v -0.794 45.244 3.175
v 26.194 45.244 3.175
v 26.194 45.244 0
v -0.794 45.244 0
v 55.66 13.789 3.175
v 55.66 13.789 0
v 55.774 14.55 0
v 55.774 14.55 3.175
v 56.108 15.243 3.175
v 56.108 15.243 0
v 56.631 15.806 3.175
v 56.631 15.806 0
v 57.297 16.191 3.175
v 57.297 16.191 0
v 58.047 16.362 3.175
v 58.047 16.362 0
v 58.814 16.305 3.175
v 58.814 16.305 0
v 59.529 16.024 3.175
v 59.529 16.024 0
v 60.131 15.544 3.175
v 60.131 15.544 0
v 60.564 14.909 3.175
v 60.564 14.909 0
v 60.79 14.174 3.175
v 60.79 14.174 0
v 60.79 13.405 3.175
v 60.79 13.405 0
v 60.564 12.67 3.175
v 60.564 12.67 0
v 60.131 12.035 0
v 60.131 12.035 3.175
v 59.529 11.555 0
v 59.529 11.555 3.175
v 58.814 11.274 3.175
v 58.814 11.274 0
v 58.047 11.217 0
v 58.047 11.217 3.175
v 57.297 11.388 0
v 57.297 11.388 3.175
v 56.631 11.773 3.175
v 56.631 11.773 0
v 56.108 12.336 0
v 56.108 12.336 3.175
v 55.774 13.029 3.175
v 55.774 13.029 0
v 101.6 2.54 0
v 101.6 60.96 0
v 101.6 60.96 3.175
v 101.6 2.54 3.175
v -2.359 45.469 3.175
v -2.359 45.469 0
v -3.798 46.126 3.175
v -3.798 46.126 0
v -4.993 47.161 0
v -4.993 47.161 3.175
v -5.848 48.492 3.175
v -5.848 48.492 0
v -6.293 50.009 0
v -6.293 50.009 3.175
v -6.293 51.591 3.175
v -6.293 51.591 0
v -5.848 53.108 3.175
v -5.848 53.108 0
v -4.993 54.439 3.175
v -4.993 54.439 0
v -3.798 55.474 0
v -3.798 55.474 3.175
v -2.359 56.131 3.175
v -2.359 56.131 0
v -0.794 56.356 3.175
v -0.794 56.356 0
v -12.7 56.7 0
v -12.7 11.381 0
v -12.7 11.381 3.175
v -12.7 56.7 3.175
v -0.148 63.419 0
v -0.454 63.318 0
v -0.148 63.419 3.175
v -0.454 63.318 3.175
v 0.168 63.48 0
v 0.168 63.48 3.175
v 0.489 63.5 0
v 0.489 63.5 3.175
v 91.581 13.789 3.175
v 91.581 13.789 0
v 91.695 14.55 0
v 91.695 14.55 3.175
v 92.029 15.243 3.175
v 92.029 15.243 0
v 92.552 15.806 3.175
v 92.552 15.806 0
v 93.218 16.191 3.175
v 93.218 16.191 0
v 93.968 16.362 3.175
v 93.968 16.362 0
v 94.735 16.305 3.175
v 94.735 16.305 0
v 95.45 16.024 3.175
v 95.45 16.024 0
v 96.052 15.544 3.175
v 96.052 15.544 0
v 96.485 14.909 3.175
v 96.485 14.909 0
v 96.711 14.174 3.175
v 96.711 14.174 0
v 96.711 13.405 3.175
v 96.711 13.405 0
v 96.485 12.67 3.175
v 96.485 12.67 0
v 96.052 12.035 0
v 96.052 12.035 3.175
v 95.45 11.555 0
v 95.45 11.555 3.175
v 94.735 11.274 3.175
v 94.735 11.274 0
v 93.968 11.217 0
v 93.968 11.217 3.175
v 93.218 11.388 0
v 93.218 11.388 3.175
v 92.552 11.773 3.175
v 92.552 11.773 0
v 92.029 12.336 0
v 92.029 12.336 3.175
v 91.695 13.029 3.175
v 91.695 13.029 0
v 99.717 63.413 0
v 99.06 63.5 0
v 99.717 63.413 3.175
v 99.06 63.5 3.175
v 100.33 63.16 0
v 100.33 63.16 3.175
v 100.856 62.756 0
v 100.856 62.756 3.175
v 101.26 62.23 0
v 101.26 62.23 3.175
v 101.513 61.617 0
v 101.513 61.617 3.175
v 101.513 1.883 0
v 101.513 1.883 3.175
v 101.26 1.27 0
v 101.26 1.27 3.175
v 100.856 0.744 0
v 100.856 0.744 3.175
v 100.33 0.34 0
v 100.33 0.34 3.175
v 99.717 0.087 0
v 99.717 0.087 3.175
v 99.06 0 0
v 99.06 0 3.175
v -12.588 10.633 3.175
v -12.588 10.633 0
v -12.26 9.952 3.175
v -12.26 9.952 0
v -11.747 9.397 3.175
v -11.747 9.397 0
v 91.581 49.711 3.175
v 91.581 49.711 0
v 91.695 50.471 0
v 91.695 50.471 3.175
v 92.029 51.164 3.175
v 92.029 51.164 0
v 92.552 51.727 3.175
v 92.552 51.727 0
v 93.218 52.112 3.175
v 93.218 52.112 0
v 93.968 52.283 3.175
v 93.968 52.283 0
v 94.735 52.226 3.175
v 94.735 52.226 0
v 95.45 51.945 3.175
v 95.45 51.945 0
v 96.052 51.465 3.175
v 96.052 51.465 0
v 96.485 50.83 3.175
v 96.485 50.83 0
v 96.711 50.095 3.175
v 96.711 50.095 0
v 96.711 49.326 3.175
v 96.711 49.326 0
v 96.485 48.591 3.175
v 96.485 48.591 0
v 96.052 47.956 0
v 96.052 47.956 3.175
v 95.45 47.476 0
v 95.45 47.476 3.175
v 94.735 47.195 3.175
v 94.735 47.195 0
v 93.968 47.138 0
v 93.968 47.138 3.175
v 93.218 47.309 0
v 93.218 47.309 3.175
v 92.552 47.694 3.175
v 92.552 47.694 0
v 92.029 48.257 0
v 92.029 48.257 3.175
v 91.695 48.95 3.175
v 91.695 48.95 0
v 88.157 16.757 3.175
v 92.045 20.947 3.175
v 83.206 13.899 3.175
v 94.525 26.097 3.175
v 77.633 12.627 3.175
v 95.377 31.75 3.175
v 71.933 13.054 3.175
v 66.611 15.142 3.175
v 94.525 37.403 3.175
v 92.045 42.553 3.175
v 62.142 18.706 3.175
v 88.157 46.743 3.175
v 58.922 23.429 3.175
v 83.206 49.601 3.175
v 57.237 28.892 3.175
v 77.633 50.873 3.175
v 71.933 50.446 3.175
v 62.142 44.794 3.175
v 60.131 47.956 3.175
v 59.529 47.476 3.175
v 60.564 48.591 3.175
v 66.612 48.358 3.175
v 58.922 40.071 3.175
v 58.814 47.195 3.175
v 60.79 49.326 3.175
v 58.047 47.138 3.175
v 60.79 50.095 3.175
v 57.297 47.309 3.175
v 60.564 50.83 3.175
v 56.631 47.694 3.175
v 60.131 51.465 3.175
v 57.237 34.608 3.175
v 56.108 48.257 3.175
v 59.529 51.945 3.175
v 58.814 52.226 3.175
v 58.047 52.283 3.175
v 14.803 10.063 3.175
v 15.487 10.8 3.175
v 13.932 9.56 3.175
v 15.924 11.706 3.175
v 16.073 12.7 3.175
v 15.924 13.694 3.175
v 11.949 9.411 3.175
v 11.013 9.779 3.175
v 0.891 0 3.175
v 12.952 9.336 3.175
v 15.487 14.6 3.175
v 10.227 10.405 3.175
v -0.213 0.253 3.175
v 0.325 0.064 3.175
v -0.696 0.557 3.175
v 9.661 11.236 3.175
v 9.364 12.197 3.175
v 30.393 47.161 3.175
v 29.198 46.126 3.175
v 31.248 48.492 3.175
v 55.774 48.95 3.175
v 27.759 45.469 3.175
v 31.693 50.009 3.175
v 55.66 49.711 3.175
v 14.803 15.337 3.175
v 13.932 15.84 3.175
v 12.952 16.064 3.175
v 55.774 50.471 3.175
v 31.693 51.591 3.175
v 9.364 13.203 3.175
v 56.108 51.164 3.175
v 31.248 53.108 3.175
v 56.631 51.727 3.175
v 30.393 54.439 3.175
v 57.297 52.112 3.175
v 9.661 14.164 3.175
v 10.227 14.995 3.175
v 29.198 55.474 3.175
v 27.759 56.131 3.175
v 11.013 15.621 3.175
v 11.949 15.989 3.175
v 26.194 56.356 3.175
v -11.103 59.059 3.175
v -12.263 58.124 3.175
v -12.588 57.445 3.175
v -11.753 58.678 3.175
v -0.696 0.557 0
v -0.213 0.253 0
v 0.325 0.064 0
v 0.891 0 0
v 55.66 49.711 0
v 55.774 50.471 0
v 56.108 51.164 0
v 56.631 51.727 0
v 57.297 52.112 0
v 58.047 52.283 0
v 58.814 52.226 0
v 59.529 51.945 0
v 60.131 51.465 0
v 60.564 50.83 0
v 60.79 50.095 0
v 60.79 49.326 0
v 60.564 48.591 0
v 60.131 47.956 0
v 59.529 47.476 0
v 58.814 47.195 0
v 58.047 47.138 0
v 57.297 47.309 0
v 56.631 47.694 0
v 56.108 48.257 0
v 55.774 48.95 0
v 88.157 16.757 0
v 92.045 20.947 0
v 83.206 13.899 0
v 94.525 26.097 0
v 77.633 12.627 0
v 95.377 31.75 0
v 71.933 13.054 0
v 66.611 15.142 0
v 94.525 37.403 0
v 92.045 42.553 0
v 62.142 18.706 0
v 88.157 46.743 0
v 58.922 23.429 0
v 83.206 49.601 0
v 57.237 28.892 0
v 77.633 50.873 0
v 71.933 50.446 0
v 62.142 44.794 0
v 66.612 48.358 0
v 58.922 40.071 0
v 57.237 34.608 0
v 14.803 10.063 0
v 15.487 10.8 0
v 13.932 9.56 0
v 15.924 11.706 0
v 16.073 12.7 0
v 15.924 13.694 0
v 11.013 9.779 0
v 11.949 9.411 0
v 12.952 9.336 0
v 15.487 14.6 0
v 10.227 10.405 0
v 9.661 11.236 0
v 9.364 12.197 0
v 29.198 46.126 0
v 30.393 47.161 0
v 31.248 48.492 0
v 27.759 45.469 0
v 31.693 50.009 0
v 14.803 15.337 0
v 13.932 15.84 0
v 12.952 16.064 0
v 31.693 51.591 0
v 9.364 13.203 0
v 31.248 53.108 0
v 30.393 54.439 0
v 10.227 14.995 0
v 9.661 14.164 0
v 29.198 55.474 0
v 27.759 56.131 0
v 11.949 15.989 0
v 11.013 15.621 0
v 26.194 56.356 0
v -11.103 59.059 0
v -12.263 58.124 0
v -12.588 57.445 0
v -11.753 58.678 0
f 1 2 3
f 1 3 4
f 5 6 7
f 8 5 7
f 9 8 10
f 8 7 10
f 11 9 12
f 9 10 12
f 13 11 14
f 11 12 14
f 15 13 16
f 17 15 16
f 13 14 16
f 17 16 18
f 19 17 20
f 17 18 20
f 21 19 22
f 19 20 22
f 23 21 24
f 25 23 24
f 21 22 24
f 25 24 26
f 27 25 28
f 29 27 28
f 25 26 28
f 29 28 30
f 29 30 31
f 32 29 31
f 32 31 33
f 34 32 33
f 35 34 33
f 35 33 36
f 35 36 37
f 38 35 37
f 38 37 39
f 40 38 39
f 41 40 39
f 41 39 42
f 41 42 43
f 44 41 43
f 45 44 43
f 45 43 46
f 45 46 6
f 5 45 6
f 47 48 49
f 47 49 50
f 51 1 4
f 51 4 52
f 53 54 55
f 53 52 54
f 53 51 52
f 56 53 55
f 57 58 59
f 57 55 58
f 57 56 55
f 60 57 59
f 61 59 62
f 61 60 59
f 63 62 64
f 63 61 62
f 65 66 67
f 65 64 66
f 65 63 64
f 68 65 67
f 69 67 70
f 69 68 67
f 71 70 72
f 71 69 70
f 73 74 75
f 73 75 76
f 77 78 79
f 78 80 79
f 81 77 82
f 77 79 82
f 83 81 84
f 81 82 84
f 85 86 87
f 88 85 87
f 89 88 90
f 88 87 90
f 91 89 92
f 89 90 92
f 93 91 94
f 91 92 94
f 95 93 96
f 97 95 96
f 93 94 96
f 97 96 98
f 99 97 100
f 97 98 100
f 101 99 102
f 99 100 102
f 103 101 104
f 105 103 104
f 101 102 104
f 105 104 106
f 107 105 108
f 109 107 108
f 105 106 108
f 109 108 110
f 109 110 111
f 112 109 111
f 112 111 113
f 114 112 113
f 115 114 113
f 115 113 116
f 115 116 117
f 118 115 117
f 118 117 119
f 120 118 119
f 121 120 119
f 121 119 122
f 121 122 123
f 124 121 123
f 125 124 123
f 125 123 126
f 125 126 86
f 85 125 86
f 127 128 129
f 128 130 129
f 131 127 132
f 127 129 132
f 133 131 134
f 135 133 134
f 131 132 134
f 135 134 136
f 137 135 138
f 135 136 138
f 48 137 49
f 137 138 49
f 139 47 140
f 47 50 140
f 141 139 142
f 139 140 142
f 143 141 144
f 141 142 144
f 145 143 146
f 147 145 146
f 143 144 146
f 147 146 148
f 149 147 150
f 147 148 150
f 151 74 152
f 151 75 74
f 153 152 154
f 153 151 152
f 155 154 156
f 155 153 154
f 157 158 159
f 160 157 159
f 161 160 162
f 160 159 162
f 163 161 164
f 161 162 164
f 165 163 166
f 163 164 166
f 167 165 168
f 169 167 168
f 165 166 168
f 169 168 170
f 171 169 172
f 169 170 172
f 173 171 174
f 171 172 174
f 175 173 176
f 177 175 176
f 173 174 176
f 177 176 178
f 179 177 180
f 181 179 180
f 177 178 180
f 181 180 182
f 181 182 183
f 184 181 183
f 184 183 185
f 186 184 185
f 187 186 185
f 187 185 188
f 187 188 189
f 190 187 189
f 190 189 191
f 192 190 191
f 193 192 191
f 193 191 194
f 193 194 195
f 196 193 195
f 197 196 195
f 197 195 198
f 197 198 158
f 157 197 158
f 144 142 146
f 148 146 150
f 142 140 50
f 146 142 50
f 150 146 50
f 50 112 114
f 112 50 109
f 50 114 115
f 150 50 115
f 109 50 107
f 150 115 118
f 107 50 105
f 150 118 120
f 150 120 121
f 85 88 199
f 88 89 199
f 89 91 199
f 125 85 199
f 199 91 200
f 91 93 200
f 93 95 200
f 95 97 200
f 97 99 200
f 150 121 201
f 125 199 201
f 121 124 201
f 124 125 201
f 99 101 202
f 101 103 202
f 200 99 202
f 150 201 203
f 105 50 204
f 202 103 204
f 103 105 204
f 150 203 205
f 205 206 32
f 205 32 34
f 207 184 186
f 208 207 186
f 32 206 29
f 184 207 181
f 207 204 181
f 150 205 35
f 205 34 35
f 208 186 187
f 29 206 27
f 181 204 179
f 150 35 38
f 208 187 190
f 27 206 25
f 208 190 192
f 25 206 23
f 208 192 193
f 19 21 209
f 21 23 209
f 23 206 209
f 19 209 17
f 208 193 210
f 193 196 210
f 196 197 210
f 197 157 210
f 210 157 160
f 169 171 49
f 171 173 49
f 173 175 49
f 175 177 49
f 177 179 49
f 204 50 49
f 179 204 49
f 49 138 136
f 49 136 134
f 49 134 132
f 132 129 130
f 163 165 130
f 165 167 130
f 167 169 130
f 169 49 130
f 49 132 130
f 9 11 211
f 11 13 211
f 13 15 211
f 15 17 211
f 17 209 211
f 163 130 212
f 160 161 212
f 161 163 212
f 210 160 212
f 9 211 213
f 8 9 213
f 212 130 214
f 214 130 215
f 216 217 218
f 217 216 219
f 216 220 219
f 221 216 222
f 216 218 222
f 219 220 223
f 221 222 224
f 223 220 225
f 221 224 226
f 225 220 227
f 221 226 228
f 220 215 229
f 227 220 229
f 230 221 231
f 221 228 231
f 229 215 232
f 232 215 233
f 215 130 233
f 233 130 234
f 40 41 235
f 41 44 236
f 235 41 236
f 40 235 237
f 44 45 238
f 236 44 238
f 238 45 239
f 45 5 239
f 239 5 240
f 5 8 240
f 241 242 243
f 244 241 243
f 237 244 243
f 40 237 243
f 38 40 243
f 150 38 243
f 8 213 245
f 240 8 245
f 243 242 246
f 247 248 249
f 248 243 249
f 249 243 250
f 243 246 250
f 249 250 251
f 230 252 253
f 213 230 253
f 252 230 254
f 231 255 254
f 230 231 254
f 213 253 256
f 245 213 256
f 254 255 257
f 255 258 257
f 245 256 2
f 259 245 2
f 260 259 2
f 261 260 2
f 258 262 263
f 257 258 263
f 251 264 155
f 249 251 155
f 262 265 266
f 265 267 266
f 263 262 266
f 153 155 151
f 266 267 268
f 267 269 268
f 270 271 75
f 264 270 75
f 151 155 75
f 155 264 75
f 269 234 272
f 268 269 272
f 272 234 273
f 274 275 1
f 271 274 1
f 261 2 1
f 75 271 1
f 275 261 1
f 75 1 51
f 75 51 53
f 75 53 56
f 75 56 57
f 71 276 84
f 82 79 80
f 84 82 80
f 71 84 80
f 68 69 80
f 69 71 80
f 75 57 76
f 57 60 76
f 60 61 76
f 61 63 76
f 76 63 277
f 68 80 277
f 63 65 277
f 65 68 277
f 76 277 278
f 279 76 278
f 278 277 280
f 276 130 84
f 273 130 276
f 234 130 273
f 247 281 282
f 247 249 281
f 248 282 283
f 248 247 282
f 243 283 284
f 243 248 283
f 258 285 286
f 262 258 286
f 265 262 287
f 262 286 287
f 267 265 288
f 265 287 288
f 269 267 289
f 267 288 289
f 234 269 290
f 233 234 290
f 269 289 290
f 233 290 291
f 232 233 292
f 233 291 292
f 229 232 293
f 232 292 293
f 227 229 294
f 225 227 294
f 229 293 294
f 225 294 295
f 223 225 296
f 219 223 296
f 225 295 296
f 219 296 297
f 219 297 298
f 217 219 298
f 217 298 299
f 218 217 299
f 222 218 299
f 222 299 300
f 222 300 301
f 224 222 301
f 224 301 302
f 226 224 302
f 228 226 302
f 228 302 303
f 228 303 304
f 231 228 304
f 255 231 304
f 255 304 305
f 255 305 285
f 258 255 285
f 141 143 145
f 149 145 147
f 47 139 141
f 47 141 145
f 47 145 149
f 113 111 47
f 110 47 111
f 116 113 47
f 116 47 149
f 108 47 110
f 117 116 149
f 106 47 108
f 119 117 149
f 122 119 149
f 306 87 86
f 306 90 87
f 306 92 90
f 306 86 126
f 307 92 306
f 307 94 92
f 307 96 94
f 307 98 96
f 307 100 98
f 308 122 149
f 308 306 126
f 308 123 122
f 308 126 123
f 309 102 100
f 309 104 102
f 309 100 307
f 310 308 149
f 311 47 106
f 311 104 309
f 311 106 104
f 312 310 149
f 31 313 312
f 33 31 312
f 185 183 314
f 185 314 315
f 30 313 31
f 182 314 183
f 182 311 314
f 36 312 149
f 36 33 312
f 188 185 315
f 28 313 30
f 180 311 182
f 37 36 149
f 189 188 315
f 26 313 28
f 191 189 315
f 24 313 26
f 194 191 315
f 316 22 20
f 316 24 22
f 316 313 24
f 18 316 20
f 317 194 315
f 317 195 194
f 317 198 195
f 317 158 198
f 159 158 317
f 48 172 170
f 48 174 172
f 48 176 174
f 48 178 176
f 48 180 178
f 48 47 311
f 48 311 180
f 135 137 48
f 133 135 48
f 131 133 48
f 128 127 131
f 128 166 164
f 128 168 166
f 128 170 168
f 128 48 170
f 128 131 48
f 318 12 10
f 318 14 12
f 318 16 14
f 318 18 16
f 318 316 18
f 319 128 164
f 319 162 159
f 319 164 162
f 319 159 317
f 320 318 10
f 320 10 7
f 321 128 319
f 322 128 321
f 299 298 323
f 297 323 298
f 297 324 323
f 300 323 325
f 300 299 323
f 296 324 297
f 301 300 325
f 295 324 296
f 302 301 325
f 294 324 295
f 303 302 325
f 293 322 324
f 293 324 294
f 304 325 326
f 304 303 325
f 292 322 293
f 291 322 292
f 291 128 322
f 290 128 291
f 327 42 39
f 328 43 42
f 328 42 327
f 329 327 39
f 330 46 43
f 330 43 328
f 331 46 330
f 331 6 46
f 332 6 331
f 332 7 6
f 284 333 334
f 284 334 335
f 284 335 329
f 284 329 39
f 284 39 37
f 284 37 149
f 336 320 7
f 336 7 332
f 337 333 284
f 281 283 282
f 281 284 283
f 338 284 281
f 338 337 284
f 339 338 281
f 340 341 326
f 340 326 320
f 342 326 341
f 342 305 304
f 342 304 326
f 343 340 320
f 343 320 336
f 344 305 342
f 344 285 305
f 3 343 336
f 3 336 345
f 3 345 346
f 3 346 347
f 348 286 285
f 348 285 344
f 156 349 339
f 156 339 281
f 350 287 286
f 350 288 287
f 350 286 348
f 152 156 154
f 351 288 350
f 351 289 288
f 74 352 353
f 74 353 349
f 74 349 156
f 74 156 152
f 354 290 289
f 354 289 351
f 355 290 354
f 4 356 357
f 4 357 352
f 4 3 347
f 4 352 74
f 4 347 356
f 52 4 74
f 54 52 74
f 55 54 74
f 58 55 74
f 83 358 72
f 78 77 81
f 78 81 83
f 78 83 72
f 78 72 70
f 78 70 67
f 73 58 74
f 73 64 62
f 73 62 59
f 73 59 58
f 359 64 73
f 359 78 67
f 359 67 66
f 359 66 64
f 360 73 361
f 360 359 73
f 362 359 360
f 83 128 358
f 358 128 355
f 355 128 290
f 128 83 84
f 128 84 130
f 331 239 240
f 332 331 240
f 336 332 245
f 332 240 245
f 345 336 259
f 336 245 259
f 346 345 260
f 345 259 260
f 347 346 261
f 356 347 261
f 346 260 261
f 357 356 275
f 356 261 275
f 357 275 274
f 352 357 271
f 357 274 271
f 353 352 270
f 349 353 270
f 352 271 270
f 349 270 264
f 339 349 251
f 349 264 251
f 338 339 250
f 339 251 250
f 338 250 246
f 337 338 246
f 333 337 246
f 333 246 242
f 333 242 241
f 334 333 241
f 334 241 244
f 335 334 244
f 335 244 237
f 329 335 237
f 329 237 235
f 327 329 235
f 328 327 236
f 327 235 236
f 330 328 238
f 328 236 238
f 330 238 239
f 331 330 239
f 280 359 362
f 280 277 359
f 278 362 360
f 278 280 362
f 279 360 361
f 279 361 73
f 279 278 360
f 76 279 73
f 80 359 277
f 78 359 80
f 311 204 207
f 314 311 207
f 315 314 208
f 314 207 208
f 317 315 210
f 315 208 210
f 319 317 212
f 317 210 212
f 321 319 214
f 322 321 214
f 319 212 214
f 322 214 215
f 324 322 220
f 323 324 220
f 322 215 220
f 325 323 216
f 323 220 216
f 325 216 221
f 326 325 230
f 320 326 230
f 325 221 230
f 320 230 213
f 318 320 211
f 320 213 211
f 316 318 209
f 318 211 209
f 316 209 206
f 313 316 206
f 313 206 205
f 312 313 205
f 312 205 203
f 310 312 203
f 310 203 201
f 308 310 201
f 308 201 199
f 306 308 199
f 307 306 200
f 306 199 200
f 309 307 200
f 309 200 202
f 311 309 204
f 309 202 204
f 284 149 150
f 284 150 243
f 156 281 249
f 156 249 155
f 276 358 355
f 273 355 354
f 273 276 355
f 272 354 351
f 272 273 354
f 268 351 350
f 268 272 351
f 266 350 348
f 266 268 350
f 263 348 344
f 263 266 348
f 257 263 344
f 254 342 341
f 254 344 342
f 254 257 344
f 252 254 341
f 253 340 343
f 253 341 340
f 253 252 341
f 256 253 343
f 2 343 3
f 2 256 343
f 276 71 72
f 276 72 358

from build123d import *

# Parameters (mm, degrees)
BOSS_EXTRUDE1_DEPTH              = 3.175
SKETCH2_R                        = 19.177
CUT_EXTRUDE1_DEPTH               = 3.175
SKETCH3_R                        = 3.3734375
CUT_EXTRUDE2_DEPTH               = 3.175
CUT_EXTRUDE3_DEPTH               = 120.85362166
FILLET1_R                        = 2.54
F_13_64_0_20313_DIAMETER_HOLE1_D = 5.159502


with BuildPart() as part:
    # Sketch1 → Boss-Extrude1 (new body)
    with BuildSketch(Plane.XY):
        Polygon((-12.7, 58.42), (0, 63.5), (101.6, 63.5), (101.6, 0), (0, 0), (-12.7, 10.16), align=None)
    extrude(amount=BOSS_EXTRUDE1_DEPTH)

    # Sketch2 → Cut-Extrude1 (cut)
    with BuildSketch(Plane.XY.offset(3.175)):
        with Locations((76.2, 31.75)):
            Circle(SKETCH2_R)
    extrude(amount=-CUT_EXTRUDE1_DEPTH, mode=Mode.SUBTRACT)

    # Sketch3 → Cut-Extrude2 (cut)
    with BuildSketch(Plane.XY.offset(3.175)):
        with Locations((12.7, 12.7)):
            Circle(SKETCH3_R)
    extrude(amount=-CUT_EXTRUDE2_DEPTH, mode=Mode.SUBTRACT)

    # Sketch4 → Cut-Extrude3 (cut, through all)
    with BuildSketch(Plane.XY.offset(3.175)):
        with BuildLine():
            Line((-0.79375, 56.35625), (26.19375, 56.35625))
            ThreePointArc((26.19375, 56.35625), (31.75, 50.8), (26.19375, 45.24375))
            Line((26.19375, 45.24375), (-0.79375, 45.24375))
            ThreePointArc((-0.79375, 45.24375), (-6.35, 50.8), (-0.79375, 56.35625))
        make_face()
    extrude(amount=-CUT_EXTRUDE3_DEPTH, mode=Mode.SUBTRACT)

    # Fillet1
    fillet1_edges = [part.edges().sort_by_distance(p)[0] for p in [
        (-12.7, 10.16, 1.5875),
        (-12.7, 58.42, 1.5875),
        (0, 63.5, 1.5875),
        (101.6, 63.5, 1.5875),
        (101.6, 0, 1.5875),
        (0, 0, 1.5875),
    ]]
    fillet(fillet1_edges, radius=FILLET1_R)

    # 13/64 (0.20313) Diameter Hole1 (through all)
    with Locations(Plane.XY.offset(3.175)):
        with Locations((58.239487758, 49.710512242), (94.160512242, 49.710512242), (94.160512242, 13.789487758), (58.239487758, 13.789487758)):
            Hole(F_13_64_0_20313_DIAMETER_HOLE1_D / 2)


solid = part.part
